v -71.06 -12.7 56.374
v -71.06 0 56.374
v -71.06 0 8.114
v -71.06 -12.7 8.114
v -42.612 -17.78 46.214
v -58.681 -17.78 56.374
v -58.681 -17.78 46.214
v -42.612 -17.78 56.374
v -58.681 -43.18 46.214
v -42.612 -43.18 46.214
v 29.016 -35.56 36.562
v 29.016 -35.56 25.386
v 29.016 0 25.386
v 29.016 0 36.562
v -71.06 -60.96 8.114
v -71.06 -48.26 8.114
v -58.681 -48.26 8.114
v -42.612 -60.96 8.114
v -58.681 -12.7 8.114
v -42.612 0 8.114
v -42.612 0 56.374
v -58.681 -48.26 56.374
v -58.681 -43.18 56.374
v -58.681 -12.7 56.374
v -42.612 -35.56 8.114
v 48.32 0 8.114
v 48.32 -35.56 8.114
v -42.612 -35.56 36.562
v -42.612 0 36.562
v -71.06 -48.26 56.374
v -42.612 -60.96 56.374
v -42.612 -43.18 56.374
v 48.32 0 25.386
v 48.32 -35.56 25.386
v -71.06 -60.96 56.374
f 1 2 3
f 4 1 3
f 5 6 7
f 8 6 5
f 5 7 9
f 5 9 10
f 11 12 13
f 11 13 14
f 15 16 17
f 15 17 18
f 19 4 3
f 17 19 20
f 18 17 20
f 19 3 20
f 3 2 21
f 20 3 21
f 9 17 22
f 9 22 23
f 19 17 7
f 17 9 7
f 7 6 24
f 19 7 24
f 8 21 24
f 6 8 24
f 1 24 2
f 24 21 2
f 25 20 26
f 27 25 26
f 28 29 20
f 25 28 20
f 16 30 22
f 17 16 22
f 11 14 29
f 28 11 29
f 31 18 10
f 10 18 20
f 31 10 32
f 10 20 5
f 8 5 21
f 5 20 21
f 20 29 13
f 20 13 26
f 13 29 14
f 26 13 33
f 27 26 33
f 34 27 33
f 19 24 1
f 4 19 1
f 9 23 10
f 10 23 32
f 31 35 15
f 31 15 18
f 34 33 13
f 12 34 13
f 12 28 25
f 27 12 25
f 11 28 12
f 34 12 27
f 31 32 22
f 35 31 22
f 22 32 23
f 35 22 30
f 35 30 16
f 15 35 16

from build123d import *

# Parameters (mm, degrees)
F1_DEPTH = 60.96
F3_DEPTH = 35.56
F2_W     = 16.069296
F2_H     = 25.4
F4_DEPTH = 10.16
F5_DEPTH = 48.26


with BuildPart() as f1:
    # F0 (on Front) → F1 (new body)
    with BuildSketch(Plane.XZ):
        Polygon((-42.611507, 56.373797), (-71.059507, 56.373797), (-71.059507, 8.113797), (-42.611507, 8.113797), (-42.611507, 36.561797), align=None)
    extrude(amount=F1_DEPTH)

    # F2 (on face) → F4 (cut)
    with BuildSketch(Plane.XY.offset(56.373797)):
        with Locations((-50.646155, -30.48)):
            Rectangle(F2_W, F2_H)
    extrude(amount=-F4_DEPTH, mode=Mode.SUBTRACT)

    # F2 (on face) → F5 (cut)
    with BuildSketch(Plane.XY.offset(56.373797)):
        Polygon((-58.680803, -43.18), (-58.680803, -17.78), (-58.680803, -12.7), (-71.059507, -12.7), (-71.059507, -48.26), (-58.680803, -48.26), align=None)
    extrude(amount=-F5_DEPTH, mode=Mode.SUBTRACT)


with BuildPart() as f3:
    # F0 (on Front) → F3 (new body)
    with BuildSketch(Plane.XZ):
        Polygon((29.016493, 36.561797), (-42.611507, 36.561797), (-42.611507, 8.113797), (48.320493, 8.113797), (48.320493, 25.385797), (29.016493, 25.385797), align=None)
    extrude(amount=F3_DEPTH)


solid = Compound([f1.part, f3.part])
